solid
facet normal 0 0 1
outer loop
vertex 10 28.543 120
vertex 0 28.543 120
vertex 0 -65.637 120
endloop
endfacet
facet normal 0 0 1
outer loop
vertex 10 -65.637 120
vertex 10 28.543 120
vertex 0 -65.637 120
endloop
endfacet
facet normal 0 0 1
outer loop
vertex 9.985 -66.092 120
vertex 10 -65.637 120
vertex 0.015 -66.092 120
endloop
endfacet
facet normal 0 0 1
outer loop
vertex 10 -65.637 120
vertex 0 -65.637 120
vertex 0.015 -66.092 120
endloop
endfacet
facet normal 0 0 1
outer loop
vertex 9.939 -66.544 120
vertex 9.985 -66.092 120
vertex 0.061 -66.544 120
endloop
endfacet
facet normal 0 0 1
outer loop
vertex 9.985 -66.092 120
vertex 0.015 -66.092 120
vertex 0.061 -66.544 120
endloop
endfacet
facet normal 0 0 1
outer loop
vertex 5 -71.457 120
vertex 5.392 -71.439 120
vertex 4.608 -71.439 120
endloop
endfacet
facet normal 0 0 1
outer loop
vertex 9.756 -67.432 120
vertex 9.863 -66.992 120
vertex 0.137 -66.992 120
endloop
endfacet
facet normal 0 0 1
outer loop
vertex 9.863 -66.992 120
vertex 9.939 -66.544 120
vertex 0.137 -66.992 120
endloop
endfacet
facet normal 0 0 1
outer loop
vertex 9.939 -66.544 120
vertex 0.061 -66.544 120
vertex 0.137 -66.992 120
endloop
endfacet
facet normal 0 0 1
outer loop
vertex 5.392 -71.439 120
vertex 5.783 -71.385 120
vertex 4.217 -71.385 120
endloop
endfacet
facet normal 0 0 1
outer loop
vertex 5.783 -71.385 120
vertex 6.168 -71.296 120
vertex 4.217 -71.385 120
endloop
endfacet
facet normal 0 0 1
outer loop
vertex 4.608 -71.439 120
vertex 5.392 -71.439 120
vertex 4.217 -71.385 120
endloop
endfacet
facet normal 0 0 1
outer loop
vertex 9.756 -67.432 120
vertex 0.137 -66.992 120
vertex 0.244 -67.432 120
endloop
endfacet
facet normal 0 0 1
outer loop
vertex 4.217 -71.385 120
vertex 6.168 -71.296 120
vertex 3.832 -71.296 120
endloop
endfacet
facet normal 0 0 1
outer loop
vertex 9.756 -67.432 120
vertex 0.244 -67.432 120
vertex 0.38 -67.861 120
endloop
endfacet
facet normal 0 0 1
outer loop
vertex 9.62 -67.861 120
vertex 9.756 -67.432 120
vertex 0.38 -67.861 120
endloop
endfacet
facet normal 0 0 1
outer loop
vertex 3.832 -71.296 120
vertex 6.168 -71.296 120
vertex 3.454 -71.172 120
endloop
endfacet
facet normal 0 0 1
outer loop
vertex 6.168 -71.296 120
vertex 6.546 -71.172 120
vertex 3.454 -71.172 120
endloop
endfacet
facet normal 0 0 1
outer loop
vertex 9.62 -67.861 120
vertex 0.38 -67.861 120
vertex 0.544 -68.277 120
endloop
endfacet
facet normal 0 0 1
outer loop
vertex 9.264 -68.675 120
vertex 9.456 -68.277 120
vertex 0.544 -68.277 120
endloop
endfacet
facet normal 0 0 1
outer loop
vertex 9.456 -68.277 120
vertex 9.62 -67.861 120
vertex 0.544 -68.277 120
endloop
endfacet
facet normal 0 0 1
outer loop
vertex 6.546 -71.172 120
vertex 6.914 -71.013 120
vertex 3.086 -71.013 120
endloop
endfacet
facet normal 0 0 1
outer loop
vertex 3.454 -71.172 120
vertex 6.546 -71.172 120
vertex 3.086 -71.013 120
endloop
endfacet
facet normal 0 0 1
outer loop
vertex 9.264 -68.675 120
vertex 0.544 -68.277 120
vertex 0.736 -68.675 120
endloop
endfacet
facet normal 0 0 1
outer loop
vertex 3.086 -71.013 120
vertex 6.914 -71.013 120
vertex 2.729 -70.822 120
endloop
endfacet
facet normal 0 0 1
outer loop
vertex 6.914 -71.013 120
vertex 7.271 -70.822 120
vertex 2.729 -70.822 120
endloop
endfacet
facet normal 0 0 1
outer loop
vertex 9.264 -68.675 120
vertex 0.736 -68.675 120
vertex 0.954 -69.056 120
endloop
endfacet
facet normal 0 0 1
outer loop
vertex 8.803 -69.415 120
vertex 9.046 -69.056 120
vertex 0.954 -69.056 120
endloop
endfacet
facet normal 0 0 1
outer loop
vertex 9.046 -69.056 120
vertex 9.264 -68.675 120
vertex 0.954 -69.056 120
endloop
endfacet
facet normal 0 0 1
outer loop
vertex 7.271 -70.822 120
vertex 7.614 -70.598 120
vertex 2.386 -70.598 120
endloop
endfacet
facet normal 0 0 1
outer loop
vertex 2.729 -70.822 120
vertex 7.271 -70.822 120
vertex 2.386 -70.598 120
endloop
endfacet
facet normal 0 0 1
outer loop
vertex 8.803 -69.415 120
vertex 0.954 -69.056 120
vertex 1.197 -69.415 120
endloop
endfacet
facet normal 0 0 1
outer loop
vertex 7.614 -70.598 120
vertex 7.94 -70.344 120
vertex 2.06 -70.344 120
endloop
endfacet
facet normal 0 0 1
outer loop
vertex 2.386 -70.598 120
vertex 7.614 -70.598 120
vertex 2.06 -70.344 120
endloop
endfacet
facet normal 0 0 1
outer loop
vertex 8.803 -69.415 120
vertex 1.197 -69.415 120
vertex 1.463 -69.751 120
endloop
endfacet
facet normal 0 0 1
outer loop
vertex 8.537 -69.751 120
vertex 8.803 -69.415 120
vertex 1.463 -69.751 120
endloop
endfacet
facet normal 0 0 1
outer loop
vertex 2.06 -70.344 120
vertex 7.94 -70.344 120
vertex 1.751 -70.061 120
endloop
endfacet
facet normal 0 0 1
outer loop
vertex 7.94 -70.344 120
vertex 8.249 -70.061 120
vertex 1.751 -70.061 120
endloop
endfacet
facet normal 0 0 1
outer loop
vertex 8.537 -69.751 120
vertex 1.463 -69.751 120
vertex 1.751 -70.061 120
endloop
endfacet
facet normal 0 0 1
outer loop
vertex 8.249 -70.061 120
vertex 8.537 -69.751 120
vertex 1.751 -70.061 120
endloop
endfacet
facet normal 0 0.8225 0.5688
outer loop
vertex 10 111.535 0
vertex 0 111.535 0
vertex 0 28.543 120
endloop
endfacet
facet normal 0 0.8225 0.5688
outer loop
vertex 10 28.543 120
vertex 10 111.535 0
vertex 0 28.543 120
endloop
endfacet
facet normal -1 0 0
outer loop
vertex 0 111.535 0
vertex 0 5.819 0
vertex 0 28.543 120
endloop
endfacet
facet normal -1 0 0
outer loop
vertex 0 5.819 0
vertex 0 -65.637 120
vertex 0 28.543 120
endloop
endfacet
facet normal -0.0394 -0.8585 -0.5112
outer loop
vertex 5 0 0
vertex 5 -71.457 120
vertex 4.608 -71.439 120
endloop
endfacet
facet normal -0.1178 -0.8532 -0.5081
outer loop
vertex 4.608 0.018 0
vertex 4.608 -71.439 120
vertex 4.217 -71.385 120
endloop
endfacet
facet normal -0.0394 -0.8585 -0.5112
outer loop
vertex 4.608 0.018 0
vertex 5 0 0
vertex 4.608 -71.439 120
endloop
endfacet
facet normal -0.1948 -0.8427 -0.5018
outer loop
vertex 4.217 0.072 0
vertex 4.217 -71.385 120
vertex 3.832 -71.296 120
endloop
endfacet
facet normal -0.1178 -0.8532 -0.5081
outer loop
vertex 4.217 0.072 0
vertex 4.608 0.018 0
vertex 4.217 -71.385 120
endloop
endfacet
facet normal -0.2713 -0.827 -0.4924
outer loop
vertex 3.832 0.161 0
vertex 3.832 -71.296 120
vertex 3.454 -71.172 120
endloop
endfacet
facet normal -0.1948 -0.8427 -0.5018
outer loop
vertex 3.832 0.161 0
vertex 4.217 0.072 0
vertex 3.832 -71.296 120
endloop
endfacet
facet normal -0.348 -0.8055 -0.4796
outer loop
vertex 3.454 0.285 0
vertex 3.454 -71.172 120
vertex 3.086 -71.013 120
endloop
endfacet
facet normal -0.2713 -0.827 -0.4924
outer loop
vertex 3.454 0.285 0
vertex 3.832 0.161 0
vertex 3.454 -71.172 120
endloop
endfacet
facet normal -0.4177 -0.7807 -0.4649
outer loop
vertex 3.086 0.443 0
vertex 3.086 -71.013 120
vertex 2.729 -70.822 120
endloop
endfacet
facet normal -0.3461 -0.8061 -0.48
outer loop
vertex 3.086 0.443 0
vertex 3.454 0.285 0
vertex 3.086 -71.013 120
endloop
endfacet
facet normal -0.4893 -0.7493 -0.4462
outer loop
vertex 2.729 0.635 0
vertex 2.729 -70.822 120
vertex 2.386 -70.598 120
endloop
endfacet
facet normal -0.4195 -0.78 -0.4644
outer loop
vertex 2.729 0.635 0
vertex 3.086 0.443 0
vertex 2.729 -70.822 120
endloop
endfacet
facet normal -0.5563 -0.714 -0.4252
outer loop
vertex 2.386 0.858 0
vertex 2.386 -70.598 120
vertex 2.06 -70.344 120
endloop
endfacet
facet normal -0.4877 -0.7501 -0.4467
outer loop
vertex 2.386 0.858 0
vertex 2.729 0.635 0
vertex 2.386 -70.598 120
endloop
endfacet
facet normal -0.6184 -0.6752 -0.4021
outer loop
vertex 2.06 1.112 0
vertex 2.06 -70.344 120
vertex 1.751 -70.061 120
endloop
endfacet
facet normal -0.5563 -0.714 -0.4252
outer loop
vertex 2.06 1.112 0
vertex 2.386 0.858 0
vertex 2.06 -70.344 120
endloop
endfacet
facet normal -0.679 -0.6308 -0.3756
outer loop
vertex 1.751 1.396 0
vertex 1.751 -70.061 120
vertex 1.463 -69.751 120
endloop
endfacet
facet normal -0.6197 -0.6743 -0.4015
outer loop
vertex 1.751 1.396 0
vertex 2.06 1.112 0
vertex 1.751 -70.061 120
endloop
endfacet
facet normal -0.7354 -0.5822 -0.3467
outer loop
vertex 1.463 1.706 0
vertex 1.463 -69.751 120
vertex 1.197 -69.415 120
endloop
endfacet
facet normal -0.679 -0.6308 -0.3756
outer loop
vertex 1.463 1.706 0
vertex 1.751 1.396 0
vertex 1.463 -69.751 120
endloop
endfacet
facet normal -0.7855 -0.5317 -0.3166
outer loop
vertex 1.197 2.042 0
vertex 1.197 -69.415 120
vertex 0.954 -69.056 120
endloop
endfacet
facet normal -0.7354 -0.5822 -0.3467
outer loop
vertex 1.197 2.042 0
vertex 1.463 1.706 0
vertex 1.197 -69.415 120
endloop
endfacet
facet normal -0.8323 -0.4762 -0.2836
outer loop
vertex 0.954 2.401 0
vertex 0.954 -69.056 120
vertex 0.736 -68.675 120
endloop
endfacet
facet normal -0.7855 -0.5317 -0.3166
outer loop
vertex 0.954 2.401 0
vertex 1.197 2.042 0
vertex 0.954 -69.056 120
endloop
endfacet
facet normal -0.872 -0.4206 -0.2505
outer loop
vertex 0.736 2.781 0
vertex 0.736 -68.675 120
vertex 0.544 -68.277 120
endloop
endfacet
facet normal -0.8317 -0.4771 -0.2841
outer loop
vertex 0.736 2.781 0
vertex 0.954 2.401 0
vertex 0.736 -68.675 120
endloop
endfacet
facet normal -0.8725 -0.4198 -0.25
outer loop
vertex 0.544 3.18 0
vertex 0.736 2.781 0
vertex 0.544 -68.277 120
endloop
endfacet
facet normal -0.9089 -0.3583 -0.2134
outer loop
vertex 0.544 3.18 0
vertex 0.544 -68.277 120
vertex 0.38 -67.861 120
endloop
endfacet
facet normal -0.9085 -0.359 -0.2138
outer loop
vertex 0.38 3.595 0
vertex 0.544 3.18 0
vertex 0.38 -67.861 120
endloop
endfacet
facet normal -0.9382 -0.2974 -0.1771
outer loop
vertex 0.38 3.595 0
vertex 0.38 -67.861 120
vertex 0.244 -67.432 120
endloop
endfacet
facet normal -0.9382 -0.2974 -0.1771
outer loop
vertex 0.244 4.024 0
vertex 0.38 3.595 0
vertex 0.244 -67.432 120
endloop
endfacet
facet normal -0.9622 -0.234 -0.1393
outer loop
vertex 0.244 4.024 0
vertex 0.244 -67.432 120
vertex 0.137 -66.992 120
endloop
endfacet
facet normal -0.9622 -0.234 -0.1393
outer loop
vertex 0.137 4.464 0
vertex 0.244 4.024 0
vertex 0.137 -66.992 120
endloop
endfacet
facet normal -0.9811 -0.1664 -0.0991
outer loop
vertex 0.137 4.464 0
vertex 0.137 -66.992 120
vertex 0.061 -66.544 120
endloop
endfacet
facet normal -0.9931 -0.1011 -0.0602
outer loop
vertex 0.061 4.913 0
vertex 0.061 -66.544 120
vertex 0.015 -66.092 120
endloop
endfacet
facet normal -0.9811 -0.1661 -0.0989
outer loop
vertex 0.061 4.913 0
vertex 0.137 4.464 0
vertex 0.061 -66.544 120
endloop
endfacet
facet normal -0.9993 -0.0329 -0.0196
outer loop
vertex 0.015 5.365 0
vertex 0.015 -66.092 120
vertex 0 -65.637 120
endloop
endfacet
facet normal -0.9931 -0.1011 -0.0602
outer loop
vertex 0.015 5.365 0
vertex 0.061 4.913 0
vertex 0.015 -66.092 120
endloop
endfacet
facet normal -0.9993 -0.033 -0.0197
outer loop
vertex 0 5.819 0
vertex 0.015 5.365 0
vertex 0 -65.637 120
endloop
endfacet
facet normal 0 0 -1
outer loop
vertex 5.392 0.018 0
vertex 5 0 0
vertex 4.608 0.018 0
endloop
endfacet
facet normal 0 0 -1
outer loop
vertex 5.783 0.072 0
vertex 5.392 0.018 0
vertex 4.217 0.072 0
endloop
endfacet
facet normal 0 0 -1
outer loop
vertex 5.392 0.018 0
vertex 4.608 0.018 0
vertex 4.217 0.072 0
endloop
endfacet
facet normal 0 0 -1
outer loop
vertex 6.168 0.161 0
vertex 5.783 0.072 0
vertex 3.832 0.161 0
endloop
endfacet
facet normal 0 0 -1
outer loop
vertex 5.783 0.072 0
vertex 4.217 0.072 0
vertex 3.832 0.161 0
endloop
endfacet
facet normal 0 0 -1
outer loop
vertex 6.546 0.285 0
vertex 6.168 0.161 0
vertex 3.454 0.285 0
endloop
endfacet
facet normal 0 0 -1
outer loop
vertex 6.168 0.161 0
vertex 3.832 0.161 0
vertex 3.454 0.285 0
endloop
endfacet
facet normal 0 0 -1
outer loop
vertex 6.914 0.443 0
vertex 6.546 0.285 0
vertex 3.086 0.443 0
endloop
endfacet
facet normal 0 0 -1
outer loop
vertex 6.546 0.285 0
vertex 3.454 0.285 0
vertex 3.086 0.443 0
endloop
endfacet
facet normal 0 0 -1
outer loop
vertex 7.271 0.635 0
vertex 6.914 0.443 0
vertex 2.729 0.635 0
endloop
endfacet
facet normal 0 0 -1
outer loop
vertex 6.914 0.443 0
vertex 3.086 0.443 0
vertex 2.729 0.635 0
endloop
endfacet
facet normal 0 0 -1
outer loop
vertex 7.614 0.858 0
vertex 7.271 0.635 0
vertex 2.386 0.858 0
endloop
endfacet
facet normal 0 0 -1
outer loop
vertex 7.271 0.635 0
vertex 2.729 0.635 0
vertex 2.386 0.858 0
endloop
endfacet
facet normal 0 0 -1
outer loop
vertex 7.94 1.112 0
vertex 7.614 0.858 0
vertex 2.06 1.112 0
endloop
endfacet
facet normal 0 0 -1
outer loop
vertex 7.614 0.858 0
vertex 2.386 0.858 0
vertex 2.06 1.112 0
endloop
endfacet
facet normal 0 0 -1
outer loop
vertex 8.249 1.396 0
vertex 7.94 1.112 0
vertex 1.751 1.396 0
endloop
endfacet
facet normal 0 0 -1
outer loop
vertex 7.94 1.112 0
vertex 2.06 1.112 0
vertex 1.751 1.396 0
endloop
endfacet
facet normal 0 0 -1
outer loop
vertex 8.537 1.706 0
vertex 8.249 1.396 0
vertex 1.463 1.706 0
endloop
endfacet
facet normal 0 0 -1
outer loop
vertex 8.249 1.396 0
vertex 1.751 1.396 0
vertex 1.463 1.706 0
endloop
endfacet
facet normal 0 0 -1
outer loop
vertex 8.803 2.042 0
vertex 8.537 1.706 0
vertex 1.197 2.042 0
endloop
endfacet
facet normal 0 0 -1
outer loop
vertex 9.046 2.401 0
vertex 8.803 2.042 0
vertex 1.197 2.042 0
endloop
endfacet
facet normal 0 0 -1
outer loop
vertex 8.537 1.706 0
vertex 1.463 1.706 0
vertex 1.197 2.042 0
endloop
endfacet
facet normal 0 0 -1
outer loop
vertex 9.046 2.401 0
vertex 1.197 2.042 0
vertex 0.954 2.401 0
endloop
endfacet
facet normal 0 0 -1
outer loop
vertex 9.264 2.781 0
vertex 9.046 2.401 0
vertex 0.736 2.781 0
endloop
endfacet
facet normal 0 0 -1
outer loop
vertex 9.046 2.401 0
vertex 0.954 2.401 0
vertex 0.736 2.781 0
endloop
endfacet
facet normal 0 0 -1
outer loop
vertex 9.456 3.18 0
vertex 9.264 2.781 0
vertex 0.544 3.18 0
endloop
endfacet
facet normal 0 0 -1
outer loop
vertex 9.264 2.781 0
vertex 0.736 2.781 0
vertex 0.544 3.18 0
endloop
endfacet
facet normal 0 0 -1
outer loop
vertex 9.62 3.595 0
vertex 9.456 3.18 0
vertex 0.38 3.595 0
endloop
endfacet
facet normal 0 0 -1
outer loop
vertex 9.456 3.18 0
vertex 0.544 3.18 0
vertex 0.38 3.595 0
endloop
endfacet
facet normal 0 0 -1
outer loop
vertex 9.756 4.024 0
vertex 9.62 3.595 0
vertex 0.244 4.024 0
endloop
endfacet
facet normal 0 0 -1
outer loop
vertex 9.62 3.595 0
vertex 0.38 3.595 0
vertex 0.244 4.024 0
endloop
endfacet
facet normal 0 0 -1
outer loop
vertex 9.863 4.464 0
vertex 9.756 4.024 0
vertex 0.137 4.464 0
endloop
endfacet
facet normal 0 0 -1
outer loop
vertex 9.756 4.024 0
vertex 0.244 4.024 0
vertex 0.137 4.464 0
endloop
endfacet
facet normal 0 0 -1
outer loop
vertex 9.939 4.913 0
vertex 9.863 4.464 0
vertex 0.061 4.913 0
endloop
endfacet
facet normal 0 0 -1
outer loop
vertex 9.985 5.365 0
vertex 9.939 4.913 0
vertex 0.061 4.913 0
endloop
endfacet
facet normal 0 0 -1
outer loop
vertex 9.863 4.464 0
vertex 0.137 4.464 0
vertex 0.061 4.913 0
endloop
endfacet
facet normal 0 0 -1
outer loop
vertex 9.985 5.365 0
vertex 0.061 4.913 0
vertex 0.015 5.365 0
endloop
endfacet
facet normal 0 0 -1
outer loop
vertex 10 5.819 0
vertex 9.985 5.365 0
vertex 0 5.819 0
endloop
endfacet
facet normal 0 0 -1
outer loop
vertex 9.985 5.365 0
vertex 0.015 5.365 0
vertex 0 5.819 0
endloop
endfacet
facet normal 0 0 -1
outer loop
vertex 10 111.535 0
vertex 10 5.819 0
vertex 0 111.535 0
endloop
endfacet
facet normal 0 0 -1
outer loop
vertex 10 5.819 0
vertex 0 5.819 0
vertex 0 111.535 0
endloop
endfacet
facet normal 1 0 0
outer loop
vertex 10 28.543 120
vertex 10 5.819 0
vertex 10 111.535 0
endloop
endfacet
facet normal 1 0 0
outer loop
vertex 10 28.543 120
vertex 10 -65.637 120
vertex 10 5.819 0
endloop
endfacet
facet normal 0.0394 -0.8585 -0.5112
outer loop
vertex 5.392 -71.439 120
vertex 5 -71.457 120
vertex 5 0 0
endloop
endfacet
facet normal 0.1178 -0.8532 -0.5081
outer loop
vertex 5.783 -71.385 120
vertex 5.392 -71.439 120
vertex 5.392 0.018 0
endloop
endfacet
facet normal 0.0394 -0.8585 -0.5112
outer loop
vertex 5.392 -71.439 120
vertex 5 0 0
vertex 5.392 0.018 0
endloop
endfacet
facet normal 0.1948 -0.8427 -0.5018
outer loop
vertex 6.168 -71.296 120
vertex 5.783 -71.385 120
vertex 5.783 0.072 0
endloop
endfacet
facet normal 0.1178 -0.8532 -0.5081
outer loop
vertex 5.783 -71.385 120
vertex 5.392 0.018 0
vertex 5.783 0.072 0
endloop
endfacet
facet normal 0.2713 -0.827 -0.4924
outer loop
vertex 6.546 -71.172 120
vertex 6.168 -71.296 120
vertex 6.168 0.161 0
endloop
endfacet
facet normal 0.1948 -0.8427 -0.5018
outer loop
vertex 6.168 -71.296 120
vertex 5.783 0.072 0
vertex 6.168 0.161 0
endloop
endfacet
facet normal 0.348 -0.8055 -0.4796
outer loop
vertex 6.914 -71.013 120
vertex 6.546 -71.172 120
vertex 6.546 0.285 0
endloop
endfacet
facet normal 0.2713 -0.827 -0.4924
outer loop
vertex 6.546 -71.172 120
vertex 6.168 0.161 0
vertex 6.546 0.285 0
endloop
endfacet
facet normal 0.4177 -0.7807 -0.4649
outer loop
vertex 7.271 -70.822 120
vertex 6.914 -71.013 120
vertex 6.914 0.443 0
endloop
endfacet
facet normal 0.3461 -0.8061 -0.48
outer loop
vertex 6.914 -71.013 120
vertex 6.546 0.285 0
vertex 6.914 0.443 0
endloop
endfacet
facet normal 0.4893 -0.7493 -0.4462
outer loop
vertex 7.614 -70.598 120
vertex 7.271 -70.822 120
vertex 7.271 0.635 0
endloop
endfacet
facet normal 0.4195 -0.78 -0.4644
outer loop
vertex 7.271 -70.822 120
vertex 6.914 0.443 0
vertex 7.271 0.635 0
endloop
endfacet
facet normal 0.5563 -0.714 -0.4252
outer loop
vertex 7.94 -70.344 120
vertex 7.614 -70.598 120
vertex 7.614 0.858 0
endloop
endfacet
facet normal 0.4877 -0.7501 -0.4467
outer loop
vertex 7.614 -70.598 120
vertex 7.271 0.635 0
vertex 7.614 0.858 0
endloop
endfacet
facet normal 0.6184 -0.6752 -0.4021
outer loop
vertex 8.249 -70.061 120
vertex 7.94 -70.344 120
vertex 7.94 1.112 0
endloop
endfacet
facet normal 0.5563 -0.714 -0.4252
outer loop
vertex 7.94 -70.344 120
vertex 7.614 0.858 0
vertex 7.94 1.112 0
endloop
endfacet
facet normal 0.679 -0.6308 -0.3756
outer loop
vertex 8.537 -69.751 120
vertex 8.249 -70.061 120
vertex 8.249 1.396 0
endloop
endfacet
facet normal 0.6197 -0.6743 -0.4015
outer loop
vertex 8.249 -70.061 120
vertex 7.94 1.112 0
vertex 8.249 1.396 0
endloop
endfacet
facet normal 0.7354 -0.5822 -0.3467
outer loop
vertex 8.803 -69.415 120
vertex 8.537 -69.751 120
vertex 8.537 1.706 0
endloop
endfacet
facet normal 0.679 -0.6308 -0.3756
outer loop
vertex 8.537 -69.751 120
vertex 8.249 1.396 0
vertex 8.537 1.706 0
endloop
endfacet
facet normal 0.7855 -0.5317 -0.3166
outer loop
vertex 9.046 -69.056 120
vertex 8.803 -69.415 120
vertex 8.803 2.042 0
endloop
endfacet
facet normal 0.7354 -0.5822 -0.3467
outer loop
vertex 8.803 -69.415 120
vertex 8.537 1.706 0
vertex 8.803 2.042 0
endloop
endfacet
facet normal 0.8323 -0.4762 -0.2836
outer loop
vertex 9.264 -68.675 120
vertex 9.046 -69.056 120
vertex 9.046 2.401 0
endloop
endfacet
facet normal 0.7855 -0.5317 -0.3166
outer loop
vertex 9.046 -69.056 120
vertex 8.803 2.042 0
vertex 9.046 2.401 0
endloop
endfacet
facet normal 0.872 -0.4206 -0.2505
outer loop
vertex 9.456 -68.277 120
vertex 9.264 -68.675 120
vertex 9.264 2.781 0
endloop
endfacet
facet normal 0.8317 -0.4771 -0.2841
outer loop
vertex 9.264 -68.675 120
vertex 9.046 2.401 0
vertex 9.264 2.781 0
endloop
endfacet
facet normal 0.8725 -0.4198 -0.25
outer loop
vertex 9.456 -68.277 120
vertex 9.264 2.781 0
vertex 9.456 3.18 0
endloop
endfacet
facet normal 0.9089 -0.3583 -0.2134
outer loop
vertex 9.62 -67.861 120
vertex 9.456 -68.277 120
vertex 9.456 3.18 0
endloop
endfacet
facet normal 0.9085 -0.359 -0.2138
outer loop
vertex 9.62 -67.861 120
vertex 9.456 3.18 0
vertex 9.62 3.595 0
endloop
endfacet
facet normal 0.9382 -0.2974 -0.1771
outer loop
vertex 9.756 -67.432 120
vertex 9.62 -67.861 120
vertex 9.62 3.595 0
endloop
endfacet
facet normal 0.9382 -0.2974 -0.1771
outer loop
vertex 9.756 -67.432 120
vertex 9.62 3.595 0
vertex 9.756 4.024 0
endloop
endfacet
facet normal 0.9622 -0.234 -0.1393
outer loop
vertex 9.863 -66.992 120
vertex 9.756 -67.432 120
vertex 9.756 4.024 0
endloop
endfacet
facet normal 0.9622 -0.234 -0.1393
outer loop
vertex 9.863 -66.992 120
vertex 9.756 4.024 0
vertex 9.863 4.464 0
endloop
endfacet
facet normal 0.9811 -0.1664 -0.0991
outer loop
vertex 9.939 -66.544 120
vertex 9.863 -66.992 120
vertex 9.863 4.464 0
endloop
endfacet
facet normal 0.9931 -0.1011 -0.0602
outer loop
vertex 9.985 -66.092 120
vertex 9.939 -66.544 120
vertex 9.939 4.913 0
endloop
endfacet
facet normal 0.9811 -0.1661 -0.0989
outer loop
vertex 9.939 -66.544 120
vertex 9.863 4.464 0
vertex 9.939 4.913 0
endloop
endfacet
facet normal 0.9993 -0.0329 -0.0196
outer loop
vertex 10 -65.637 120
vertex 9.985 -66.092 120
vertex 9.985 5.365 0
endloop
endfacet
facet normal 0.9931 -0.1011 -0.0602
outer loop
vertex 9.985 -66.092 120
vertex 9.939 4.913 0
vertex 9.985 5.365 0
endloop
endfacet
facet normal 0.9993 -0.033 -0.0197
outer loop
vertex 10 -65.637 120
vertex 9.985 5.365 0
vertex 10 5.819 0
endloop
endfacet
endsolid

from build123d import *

# Parameters (mm, degrees)
F1_DEPTH = 10
F2_R     = 4.99999


# Not quite as in the source:
# - a fillet or chamfer is up to 0.001 mm smaller than in the source, because OpenCascade refuses the exact size


with BuildPart() as f1:
    # F0 (on Right) → F1 (new body)
    with BuildSketch(Plane.YZ):
        Polygon((0, 120), (0, 0), (111.5350200628, 0), (28.5433451417, 120), align=None)
        Polygon((-71.4566548583, 120), (0, 0), (0, 120), align=None)
    extrude(amount=F1_DEPTH)

    # F2 (radius 5 in the source; OpenCascade refuses exactly that, so slightly less here)
    f2_edges = [f1.edges().sort_by_distance(p)[0] for p in [
        (0, -35.728327, 60),
        (10, -35.728327, 60),
    ]]
    fillet(f2_edges, radius=F2_R)


solid = f1.part
